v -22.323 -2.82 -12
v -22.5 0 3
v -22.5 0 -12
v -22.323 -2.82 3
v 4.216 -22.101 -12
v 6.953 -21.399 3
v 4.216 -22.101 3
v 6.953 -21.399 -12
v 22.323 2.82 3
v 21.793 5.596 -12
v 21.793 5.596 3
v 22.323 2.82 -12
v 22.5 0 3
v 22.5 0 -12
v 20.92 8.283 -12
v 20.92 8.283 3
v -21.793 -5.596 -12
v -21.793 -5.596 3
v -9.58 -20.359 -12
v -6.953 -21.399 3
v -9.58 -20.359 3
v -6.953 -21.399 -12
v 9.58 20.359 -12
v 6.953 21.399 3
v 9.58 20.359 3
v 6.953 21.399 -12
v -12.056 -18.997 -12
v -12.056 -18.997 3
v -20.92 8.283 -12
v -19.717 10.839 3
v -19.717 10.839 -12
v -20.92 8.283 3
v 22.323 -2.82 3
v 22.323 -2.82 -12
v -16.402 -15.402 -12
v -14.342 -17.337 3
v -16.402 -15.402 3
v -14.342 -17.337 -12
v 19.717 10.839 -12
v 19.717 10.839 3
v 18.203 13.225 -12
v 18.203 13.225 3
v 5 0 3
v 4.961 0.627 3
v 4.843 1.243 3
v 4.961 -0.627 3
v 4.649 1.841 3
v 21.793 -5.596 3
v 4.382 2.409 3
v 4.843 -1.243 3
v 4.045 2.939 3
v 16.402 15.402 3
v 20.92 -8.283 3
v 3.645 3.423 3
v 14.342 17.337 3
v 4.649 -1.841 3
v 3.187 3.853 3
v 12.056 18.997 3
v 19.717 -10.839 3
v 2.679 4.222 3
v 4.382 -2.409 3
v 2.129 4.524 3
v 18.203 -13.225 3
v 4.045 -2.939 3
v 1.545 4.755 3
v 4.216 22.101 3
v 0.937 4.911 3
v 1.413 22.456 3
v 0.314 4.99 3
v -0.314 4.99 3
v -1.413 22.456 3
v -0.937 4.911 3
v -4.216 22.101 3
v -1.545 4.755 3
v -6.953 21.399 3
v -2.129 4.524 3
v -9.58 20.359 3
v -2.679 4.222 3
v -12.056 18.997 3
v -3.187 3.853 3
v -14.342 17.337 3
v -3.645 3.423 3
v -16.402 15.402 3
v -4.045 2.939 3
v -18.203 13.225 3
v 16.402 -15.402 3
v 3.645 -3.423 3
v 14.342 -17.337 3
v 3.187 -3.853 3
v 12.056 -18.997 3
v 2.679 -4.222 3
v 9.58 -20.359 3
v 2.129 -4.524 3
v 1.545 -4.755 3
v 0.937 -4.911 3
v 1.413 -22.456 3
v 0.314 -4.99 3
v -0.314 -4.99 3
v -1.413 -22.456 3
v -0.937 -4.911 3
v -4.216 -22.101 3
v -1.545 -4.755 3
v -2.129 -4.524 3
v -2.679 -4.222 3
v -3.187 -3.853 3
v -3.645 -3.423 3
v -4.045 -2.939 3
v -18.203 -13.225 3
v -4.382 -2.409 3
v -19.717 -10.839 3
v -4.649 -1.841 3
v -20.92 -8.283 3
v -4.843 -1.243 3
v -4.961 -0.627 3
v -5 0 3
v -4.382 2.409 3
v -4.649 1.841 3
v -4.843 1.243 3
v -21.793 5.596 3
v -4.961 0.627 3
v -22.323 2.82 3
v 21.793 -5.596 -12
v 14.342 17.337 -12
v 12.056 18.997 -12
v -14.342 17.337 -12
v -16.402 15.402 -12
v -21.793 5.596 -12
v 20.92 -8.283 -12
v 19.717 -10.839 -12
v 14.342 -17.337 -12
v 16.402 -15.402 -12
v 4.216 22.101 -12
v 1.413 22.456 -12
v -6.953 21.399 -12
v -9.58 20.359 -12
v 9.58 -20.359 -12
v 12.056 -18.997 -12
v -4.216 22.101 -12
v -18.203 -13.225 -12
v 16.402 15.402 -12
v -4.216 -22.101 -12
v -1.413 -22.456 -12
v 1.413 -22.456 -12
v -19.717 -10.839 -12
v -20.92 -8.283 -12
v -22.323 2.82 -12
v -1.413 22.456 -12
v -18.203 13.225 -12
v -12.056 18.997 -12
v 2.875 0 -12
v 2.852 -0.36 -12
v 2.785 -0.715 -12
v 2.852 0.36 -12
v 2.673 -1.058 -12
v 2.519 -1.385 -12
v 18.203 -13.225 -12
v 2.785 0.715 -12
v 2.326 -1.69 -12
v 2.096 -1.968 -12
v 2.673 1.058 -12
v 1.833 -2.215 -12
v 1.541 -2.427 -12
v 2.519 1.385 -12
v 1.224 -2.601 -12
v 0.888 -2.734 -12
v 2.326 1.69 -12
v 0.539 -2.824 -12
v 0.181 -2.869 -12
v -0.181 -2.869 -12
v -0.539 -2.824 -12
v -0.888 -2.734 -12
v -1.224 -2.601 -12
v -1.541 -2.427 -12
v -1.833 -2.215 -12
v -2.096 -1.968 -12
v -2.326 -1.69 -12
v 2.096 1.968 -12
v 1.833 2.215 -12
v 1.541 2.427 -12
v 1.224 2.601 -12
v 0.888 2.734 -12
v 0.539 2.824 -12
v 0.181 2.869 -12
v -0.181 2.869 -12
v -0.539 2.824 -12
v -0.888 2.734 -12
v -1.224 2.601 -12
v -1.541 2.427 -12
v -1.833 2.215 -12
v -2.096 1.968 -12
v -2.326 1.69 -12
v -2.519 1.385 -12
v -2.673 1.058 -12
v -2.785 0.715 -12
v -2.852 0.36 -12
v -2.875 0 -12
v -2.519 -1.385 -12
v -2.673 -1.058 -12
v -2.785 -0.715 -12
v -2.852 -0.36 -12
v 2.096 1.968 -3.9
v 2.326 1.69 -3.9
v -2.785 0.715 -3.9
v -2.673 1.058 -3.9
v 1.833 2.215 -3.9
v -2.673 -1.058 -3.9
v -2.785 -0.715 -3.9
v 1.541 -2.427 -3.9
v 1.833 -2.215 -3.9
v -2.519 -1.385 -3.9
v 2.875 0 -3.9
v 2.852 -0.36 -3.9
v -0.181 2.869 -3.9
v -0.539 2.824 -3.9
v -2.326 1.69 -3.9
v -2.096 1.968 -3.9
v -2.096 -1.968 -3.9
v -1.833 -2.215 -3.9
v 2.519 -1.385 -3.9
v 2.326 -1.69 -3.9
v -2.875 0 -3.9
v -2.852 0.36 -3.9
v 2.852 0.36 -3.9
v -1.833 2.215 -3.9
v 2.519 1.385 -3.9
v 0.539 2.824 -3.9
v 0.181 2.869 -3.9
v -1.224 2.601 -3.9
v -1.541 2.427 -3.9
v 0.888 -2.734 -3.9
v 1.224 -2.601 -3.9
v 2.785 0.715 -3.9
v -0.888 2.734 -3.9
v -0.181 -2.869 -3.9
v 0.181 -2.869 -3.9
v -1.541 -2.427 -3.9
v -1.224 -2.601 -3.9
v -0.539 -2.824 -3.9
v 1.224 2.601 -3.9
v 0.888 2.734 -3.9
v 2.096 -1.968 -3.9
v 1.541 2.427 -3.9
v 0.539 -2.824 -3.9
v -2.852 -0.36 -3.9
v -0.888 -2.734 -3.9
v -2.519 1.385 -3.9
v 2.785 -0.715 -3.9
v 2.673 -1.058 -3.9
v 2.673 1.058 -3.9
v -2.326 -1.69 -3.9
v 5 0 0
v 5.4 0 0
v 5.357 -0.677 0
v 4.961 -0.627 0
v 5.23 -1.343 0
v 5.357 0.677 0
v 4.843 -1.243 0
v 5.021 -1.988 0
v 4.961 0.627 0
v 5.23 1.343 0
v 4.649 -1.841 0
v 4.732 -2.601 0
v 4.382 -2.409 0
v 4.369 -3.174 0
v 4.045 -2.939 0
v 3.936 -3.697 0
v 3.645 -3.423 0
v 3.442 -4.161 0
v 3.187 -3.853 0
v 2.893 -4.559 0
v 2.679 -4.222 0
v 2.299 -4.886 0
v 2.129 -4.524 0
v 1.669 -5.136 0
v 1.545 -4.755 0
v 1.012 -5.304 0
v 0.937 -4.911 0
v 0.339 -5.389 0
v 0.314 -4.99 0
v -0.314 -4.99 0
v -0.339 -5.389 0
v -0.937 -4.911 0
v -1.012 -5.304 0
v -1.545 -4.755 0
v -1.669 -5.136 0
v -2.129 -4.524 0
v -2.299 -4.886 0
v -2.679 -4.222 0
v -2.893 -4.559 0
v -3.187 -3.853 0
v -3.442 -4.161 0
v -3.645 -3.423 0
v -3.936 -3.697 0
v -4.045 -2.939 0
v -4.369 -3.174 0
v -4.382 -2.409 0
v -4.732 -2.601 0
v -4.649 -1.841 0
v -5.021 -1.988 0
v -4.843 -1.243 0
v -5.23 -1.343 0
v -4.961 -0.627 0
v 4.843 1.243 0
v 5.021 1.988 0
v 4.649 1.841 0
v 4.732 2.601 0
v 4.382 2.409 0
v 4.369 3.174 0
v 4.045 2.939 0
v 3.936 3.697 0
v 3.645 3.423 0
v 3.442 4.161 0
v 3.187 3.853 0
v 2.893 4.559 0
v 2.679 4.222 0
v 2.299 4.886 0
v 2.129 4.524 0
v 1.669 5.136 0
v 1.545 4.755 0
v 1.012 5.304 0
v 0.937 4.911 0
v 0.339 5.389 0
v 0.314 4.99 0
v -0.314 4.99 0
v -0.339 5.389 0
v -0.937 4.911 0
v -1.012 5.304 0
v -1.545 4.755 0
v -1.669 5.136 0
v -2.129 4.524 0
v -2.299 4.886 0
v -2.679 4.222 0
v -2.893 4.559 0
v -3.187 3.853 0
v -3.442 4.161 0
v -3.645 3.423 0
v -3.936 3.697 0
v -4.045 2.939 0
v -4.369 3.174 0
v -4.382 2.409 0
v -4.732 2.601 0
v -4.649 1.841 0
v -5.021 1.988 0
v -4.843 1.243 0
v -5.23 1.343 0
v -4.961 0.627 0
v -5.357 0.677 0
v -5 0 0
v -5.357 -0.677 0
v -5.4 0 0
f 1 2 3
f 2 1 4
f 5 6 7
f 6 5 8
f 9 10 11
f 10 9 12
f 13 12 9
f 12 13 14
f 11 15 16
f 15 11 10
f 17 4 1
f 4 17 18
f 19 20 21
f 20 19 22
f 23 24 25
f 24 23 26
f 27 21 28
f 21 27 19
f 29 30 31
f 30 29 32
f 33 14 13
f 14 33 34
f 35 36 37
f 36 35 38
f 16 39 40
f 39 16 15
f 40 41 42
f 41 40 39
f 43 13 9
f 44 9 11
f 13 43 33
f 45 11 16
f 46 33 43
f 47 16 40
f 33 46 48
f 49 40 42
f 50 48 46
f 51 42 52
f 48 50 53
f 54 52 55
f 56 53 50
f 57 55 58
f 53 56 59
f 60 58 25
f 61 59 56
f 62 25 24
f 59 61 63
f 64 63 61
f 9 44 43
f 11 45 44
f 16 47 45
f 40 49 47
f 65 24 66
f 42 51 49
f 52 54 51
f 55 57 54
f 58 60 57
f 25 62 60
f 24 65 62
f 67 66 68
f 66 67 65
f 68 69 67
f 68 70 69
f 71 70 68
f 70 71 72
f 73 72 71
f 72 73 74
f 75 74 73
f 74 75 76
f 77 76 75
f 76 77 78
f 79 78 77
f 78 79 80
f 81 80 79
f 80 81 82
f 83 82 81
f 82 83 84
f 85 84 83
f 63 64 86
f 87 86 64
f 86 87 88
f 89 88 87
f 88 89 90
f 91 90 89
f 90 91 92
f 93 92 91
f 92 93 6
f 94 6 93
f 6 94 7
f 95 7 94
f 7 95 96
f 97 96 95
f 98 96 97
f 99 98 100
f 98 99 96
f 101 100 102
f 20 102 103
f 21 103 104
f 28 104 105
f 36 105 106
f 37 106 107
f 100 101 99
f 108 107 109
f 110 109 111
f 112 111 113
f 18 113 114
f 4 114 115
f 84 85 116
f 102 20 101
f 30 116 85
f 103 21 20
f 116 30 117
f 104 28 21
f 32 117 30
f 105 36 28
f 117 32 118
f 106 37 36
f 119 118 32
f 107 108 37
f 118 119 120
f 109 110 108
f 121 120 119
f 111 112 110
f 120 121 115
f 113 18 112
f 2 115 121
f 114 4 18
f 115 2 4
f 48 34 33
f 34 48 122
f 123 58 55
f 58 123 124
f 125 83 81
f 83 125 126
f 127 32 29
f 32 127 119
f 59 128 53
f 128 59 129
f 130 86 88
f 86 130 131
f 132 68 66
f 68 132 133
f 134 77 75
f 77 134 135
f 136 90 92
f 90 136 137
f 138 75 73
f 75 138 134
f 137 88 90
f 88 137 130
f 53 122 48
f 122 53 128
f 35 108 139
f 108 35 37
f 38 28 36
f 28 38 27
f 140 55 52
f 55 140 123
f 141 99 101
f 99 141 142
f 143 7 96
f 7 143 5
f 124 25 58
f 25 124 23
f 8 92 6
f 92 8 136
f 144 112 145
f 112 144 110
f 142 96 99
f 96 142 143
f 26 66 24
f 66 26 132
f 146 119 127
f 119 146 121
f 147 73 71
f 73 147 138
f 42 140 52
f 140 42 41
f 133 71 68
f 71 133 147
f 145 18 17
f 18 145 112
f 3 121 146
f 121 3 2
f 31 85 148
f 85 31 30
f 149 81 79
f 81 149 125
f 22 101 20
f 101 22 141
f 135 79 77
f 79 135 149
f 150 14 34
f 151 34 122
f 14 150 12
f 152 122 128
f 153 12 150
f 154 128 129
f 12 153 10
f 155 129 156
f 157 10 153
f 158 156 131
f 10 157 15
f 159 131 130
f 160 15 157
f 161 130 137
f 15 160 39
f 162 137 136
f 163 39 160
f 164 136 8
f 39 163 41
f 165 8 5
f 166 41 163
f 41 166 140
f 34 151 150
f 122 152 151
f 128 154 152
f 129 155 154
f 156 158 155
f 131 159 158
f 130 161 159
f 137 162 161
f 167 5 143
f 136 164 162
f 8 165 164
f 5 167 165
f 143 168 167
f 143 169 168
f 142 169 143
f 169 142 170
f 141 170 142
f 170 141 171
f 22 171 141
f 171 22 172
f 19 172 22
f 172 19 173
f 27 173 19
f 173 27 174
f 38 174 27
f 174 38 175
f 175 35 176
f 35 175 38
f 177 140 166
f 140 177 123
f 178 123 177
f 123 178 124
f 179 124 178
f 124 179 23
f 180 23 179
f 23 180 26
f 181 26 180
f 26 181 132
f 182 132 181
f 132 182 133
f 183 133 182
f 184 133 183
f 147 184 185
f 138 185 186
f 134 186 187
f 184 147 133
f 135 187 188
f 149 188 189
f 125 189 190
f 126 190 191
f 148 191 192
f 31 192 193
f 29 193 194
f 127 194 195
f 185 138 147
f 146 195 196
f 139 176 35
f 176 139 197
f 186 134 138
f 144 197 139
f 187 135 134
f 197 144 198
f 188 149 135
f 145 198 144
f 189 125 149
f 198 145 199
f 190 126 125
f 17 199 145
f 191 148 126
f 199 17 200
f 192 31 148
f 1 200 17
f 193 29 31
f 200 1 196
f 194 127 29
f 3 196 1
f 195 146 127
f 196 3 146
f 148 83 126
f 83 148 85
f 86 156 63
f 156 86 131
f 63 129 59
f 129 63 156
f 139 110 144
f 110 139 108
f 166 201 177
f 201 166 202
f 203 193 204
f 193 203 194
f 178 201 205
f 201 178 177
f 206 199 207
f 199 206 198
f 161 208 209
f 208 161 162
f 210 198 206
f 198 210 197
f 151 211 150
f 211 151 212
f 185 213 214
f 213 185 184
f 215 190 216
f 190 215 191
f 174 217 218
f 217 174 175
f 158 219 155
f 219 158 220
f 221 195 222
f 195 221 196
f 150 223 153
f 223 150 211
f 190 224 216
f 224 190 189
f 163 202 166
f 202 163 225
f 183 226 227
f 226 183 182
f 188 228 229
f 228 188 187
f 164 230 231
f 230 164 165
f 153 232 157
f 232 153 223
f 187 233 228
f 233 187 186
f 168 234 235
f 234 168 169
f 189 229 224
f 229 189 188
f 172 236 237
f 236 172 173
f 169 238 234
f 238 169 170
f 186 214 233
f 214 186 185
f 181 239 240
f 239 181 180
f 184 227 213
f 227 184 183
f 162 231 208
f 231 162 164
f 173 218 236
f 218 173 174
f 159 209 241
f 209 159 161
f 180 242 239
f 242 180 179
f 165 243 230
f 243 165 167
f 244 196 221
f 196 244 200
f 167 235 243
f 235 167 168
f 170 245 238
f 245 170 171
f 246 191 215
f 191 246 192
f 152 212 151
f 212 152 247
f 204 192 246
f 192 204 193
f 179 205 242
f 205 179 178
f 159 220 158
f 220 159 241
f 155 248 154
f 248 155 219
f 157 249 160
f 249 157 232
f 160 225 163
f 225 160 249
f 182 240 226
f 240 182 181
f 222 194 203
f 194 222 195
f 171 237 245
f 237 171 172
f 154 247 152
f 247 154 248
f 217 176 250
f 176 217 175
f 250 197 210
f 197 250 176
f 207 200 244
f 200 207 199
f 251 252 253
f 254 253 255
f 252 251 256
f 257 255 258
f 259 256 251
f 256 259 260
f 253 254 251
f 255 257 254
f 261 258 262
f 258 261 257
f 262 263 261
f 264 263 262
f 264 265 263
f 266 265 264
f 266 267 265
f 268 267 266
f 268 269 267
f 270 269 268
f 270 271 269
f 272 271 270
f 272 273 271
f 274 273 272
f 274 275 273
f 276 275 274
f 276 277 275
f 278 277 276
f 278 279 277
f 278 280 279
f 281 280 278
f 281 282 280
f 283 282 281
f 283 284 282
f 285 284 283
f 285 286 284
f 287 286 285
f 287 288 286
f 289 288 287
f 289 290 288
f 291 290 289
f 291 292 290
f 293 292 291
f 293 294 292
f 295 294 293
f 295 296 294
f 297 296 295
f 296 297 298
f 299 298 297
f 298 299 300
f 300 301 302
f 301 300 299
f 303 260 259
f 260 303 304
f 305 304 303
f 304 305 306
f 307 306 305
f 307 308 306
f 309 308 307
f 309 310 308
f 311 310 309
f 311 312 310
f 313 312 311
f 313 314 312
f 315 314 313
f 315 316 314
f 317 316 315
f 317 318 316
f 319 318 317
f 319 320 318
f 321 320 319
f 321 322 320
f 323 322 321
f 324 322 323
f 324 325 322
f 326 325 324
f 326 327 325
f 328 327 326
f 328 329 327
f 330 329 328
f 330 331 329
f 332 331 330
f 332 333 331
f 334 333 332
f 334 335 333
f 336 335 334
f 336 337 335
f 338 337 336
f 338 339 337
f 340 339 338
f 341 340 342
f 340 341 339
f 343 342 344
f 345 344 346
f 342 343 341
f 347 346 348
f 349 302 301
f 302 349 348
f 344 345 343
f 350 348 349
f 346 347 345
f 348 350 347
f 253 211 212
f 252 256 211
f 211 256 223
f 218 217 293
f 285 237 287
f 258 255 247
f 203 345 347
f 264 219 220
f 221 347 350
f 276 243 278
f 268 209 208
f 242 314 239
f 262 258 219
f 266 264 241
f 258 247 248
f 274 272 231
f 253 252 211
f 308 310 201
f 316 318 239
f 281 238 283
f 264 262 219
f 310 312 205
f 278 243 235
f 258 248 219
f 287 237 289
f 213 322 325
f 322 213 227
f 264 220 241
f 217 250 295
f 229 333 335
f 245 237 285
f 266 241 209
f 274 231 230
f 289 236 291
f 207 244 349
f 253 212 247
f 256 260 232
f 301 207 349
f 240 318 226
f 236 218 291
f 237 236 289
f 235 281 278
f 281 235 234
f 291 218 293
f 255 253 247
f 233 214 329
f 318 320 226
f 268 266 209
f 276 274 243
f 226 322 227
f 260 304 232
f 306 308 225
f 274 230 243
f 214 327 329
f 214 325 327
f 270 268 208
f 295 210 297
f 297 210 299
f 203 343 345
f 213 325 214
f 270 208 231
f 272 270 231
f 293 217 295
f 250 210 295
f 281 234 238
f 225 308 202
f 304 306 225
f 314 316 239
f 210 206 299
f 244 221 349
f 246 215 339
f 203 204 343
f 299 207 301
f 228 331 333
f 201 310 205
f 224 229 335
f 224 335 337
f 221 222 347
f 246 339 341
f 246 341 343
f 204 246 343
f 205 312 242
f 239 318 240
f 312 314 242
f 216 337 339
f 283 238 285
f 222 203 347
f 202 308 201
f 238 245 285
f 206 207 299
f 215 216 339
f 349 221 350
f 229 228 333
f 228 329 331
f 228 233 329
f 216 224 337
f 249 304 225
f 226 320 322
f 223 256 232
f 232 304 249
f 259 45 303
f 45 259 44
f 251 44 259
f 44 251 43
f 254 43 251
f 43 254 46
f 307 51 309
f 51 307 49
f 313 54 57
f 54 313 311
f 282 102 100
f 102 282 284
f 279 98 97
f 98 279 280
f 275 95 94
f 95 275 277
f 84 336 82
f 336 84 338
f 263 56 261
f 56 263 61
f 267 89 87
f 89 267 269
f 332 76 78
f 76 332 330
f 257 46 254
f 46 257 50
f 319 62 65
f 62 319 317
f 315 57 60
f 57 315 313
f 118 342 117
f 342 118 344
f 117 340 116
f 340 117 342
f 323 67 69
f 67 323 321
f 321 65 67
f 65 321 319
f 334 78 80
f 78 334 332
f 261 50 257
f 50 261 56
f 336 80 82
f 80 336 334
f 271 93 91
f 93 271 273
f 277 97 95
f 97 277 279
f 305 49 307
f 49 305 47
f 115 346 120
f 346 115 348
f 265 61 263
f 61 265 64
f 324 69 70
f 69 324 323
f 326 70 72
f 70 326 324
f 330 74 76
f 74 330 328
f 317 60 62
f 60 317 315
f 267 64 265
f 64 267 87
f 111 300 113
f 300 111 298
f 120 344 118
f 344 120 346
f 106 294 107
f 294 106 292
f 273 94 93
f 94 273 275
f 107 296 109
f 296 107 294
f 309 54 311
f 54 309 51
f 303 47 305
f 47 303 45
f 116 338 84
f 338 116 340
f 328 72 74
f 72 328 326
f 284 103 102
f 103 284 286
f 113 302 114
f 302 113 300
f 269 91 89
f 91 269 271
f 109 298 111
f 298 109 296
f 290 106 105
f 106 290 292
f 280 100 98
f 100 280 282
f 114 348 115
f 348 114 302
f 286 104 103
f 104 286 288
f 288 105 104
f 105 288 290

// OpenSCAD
$fn = 50;


difference() {
	union() {
		translate(v = [0, 0, -12.0000000000]) {
			cylinder(h = 15, r = 22.5000000000);
		}
		#translate(v = [0, 0, -15.0000000000]) {
			cylinder(h = 15, r = 2.8750000000);
		}
	}
	union() {
		translate(v = [0, 0, 0]) {
			rotate(a = [0, 0, 0]) {
				difference() {
					union() {
						translate(v = [0, 0, -15.0000000000]) {
							cylinder(h = 15, r = 2.6000000000);
						}
						translate(v = [0, 0, -3.9000000000]) {
							cylinder(h = 3.9000000000, r1 = 2.8750000000, r2 = 5.4000000000);
						}
						translate(v = [0, 0, -15.0000000000]) {
							cylinder(h = 15, r = 2.8750000000);
						}
						translate(v = [0, 0, -15.0000000000]) {
							cylinder(h = 15, r = 2.6000000000);
						}
					}
					union();
				}
			}
		}
		#cylinder(h = 3, r = 5.0000000000);
	}
}
